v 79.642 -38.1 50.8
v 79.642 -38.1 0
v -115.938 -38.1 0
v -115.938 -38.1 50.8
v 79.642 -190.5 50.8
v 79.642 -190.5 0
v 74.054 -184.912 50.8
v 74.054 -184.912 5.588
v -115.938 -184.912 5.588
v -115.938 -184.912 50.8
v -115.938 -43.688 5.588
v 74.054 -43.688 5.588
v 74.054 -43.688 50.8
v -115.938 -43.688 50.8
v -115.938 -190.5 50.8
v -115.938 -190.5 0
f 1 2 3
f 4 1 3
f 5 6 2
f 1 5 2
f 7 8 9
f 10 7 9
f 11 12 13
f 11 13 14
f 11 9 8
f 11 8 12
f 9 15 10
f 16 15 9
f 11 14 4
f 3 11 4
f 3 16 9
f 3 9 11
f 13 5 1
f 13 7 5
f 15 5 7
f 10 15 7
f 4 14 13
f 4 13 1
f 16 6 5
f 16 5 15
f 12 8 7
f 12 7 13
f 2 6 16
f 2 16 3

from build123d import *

# Parameters (mm, degrees)
SKETCH2_W           = 152.4
SKETCH2_H           = 195.58
BOSS_EXTRUDE1_DEPTH = 50.8
SHELL1_T            = -5.588


with BuildPart() as part:
    # Sketch2 → Boss-Extrude1 (new body)
    with BuildSketch(Plane(origin=(0, 0, 0), x_dir=(0, 1, 0), z_dir=(0, 0, 1))):
        with Locations((-114.3, 18.147782805)):
            Rectangle(SKETCH2_W, SKETCH2_H)
    extrude(amount=BOSS_EXTRUDE1_DEPTH)

    # Shell1
    shell1_openings = [part.faces().sort_by_distance(p)[0] for p in [
        (-18.147782805, -114.3, 50.8),
        (-115.937782805, -114.3, 25.4),
    ]]
    offset(amount=SHELL1_T, openings=shell1_openings, kind=Kind.INTERSECTION)


solid = part.part
